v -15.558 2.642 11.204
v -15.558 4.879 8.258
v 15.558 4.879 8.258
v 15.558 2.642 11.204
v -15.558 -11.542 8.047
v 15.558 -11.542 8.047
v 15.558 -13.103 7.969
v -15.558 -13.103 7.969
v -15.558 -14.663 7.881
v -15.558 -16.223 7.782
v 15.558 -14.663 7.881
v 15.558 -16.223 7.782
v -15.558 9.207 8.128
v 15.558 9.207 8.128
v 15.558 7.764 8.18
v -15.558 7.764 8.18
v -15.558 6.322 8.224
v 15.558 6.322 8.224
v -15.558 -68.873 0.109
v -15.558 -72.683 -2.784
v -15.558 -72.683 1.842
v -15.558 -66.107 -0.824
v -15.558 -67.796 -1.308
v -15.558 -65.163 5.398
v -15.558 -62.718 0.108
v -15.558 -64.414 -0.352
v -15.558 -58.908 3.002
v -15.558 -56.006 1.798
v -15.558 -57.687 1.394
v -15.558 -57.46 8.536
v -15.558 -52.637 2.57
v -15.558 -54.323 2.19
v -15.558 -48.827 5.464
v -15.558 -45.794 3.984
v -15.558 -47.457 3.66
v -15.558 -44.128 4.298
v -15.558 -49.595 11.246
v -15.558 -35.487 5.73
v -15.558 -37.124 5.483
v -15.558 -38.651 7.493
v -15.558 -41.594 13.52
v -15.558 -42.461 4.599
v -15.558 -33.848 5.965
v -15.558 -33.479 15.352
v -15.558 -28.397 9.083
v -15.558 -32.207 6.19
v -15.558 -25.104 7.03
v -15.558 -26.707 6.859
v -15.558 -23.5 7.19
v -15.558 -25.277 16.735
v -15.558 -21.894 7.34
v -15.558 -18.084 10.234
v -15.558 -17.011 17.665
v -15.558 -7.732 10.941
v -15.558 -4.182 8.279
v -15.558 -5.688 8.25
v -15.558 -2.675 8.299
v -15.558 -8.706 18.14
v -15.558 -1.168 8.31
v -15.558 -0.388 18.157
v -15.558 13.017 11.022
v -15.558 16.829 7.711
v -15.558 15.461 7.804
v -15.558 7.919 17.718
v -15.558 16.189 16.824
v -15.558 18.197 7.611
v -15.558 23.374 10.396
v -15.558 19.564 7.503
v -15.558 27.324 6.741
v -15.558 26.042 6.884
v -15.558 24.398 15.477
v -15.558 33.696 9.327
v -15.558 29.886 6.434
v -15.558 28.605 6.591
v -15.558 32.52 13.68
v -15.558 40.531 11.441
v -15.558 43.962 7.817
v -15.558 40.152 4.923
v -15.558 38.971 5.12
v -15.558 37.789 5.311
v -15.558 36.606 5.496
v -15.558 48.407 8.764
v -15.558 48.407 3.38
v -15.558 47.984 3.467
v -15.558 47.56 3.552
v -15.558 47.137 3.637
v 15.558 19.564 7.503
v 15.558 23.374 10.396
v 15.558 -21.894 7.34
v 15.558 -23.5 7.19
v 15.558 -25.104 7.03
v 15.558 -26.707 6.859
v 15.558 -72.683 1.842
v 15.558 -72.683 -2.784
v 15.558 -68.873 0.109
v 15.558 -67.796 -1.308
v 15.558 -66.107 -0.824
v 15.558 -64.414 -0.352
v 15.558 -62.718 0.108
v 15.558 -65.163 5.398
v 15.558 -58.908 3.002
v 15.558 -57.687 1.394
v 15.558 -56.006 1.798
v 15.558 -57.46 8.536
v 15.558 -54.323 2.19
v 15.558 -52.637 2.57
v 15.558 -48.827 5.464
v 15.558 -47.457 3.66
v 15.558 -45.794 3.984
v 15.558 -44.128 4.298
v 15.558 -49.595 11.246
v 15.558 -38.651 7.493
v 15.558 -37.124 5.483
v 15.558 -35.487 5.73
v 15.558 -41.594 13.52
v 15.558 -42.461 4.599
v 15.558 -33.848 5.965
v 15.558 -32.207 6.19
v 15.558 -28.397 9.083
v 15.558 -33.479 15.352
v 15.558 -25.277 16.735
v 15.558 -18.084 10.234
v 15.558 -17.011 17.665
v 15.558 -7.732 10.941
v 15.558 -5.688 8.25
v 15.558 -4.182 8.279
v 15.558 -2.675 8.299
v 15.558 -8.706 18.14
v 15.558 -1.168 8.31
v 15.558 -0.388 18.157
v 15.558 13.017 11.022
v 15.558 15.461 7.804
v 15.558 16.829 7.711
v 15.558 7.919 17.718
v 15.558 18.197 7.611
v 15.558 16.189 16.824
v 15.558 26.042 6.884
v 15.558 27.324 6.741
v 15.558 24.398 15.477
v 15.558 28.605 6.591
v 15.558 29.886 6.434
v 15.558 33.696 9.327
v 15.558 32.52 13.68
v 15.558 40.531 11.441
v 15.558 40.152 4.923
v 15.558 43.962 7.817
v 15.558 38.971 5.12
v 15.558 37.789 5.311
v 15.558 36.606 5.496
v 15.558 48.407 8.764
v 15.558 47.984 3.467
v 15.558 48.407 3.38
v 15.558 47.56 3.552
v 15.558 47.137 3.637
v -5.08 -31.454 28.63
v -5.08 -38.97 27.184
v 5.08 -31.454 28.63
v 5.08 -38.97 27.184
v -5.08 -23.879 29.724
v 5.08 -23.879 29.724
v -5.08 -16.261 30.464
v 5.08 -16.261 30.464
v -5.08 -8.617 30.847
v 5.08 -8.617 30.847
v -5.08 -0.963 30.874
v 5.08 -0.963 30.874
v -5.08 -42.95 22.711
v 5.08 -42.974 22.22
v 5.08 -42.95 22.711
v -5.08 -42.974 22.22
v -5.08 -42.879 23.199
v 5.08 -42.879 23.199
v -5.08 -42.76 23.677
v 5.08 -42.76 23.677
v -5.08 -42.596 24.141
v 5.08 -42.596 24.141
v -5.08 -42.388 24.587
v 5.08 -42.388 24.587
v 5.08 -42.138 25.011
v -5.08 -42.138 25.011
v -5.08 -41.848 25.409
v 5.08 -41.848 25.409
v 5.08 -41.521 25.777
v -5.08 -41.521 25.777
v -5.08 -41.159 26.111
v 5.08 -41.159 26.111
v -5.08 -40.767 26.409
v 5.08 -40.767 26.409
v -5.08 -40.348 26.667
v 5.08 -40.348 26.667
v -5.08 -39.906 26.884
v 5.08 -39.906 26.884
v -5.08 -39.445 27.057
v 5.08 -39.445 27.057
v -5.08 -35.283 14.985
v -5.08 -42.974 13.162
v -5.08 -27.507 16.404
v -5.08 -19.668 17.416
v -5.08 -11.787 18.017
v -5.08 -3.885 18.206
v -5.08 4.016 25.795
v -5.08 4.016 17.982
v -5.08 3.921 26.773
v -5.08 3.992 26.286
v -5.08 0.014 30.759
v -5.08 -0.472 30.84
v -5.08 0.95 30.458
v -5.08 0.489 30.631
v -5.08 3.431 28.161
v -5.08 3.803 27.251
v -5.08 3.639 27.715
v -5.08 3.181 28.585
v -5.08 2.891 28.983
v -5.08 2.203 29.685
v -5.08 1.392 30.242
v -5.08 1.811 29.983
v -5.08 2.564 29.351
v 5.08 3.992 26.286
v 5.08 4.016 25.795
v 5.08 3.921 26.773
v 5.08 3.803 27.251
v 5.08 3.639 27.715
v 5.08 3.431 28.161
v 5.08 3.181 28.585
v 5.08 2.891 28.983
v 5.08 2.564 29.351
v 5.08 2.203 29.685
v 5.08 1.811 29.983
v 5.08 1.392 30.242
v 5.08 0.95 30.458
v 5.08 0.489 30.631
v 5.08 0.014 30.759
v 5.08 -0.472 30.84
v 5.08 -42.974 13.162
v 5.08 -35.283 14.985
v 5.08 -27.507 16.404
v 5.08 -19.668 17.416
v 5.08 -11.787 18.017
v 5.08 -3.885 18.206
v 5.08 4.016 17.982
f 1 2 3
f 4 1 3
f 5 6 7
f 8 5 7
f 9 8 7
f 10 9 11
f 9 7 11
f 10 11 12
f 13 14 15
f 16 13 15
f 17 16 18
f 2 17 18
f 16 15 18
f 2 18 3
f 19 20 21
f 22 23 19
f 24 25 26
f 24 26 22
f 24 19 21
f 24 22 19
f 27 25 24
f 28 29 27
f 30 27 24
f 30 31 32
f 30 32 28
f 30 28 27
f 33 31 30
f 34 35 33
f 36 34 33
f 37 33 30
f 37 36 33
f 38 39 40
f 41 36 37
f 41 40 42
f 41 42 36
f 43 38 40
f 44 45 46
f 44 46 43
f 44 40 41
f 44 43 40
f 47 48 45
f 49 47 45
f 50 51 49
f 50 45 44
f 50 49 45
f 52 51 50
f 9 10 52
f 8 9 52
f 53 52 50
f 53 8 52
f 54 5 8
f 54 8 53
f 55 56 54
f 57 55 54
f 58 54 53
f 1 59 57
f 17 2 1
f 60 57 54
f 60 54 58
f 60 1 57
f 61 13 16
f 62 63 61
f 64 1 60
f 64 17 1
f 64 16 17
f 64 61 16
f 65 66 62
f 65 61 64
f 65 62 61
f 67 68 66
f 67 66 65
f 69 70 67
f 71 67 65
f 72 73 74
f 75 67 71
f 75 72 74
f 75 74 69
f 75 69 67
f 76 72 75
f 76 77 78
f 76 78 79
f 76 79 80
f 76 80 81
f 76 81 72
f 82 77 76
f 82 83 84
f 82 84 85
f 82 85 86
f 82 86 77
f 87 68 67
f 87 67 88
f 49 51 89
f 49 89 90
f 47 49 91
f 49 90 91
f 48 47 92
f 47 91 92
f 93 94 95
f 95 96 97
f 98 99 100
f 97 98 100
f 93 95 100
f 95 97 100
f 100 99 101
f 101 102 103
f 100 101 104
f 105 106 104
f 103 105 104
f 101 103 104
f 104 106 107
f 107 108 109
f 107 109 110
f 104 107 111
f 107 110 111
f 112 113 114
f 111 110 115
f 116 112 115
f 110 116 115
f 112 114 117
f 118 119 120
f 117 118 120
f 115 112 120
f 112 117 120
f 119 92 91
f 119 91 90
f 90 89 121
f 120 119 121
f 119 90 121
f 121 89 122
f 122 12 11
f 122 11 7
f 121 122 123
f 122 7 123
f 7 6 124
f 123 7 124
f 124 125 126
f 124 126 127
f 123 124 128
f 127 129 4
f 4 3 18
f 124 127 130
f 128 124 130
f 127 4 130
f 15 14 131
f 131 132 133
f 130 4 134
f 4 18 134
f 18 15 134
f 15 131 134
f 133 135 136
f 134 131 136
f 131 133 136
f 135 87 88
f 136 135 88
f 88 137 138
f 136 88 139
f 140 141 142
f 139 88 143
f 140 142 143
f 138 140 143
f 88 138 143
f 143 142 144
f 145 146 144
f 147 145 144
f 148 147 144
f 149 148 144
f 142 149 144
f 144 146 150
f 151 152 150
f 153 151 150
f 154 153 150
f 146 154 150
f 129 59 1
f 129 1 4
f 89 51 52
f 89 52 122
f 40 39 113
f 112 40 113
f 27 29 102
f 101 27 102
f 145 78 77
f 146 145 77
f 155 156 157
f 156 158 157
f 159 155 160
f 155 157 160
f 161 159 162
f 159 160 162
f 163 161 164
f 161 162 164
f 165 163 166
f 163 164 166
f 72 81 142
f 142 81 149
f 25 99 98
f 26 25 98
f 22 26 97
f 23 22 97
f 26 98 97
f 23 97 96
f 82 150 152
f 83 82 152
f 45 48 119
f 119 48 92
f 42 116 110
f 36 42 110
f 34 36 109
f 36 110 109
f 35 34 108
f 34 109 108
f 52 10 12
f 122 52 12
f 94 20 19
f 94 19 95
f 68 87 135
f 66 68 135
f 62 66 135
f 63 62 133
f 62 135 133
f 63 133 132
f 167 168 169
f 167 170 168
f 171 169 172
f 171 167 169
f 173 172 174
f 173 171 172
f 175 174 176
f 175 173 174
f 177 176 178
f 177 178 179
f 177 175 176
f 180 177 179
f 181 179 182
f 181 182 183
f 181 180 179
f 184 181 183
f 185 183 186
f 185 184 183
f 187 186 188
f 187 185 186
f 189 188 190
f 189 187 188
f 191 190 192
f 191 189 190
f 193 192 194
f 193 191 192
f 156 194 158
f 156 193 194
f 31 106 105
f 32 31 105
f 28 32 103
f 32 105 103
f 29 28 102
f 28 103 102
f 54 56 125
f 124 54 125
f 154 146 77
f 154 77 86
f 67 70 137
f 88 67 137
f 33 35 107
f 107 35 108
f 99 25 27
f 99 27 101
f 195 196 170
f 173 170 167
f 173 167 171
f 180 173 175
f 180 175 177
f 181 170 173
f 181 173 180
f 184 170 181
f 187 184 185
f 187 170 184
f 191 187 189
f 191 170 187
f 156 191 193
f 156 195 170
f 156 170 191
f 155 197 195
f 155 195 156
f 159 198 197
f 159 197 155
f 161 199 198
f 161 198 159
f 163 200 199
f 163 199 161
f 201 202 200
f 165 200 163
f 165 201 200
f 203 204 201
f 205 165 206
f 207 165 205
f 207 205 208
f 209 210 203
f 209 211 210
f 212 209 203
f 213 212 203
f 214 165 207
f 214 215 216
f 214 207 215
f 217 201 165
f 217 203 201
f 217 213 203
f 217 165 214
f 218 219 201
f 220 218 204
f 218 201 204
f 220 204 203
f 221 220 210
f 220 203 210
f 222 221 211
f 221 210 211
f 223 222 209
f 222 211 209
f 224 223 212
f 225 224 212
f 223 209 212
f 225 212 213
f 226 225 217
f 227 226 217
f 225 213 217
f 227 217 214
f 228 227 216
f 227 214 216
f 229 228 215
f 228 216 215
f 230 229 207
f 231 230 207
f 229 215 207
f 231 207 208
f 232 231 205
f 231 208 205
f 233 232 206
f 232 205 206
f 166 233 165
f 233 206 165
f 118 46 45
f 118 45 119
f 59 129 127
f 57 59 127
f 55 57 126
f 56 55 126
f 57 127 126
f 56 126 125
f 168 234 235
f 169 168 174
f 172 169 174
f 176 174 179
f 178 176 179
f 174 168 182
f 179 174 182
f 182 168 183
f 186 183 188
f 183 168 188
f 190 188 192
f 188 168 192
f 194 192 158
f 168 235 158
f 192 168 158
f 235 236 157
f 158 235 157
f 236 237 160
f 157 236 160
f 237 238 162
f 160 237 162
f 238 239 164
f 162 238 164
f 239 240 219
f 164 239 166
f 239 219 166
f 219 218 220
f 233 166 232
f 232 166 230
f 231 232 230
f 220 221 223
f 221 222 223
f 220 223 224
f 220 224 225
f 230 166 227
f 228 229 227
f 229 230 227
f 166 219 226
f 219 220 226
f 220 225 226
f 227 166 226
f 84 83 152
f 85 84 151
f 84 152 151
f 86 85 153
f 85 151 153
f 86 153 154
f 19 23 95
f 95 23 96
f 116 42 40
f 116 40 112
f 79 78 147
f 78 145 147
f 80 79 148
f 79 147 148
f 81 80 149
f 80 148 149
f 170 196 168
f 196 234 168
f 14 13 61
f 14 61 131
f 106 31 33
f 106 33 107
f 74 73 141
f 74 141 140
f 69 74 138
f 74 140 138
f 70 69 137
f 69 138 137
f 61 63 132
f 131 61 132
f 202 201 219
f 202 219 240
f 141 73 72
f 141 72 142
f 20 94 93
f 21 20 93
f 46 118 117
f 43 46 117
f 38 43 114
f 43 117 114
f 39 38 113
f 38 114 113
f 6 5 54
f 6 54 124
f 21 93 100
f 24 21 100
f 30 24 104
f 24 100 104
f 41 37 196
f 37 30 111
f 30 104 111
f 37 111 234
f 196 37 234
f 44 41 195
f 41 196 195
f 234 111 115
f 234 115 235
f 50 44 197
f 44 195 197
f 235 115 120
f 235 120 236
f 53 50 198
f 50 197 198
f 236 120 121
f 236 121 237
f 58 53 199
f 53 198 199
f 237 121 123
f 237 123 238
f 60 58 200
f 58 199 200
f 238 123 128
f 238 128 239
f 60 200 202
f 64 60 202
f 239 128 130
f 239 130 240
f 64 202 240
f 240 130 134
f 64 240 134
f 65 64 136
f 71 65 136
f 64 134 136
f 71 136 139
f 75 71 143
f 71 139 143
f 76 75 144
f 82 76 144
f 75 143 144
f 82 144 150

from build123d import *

# Parameters (mm, degrees)
BOSS_EXTRUDE1_DEPTH      = 76.2
SKETCH2_W                = 6.985
SKETCH2_H                = 9.525
CUT_EXTRUDE1_DEPTH       = 119.84173867
CUT_EXTRUDE2_DEPTH       = 119.84173867
CUT_EXTRUDE3_DEPTH       = 119.84173867
FILLET1_R                = 2.54
CUT_EXTRUDE4_DEPTH       = 5.08
CUT_EXTRUDE6_DEPTH       = 15.113
FILLET2_R                = 0.508
BOSS_EXTRUDE3_DEPTH      = 31.115
BOSS_EXTRUDE4_DEPTH      = 5.08
CUT_EXTRUDE7_DEPTH       = 85.888967529
CRVPATTERN3_START        = 20.1179377
CRVPATTERN3_OUTLINE_W    = 31.115
CRVPATTERN3_OUTLINE_H    = 7.094089262
CRVPATTERN3_DEPTH        = 4.784345088
CRVPATTERN3_START_2      = 12.248105014
CRVPATTERN3_2_OUTLINE_W  = 31.115
CRVPATTERN3_2_OUTLINE_H  = 6.763167552
CRVPATTERN3_2_DEPTH      = 4.784345087
CRVPATTERN3_START_3      = 4.095774155
CRVPATTERN3_3_OUTLINE_W  = 31.115
CRVPATTERN3_3_OUTLINE_H  = 6.419828923
CRVPATTERN3_3_DEPTH      = 4.784345087
CRVPATTERN3_START_4      = -4.324087509
CRVPATTERN3_4_OUTLINE_W  = 31.115
CRVPATTERN3_4_OUTLINE_H  = 6.064703736
CRVPATTERN3_4_DEPTH      = 4.784345087
CRVPATTERN3_START_5      = 27.690823503
CRVPATTERN3_5_OUTLINE_W  = 31.115
CRVPATTERN3_5_OUTLINE_H  = 6.047255266
CRVPATTERN3_5_DEPTH      = 4.784345088
CRVPATTERN3_START_6      = -12.996021434
CRVPATTERN3_6_OUTLINE_W  = 31.115
CRVPATTERN3_6_OUTLINE_H  = 5.698443985
CRVPATTERN3_6_DEPTH      = 4.784345087
CRVPATTERN3_START_7      = -21.904106282
CRVPATTERN3_7_OUTLINE_W  = 31.115
CRVPATTERN3_7_OUTLINE_H  = 5.321722107
CRVPATTERN3_7_DEPTH      = 4.784345088
CRVPATTERN3_START_8      = -31.031987149
CRVPATTERN3_8_OUTLINE_W  = 31.115
CRVPATTERN3_8_OUTLINE_H  = 4.935229754
CRVPATTERN3_8_DEPTH      = 4.784345087
CRVPATTERN3_START_9      = -40.362905596
CRVPATTERN3_9_OUTLINE_W  = 31.115
CRVPATTERN3_9_OUTLINE_H  = 4.539676505
CRVPATTERN3_9_DEPTH      = 4.784345087
CRVPATTERN3_START_10     = -49.879730415
CRVPATTERN3_10_OUTLINE_W = 31.115
CRVPATTERN3_10_OUTLINE_H = 4.135788586
CRVPATTERN3_10_DEPTH     = 4.784345088
CRVPATTERN3_START_11     = -59.564989077
CRVPATTERN3_11_OUTLINE_W = 31.115
CRVPATTERN3_11_OUTLINE_H = 3.724307516
CRVPATTERN3_11_DEPTH     = 4.784345087
FILLET3_R                = 5.08


# Read off the part's stored shape, not the designer's step: CrvPattern3
with BuildPart() as part:
    # Sketch1 → Boss-Extrude1 (new body)
    with BuildSketch(Plane.XY):
        Polygon((-15.5575, 76.2), (15.5575, 76.2), (15.5575, -76.2), (7.845485509, -76.2), (9.525, -85.725), (-9.525, -85.725), (-7.845485509, -76.2), (-15.5575, -76.2), align=None)
    extrude(amount=BOSS_EXTRUDE1_DEPTH)

    # Sketch2 → Cut-Extrude1 (cut, through all)
    with BuildSketch(Plane(origin=(15.5575, 0, 0), x_dir=(0, 0, -1), z_dir=(1, 0, 0))):
        with Locations((-3.4925, -80.9625)):
            Rectangle(SKETCH2_W, SKETCH2_H)
    extrude(amount=-CUT_EXTRUDE1_DEPTH, mode=Mode.SUBTRACT)

    # Sketch3 → Cut-Extrude2 (cut, through all)
    with BuildSketch(Plane(origin=(15.5575, 0, 0), x_dir=(0, 0, -1), z_dir=(1, 0, 0))):
        with BuildLine():
            Line((-76.2, -85.725), (-76.2, -76.2))
            Line((-76.2, -76.2), (-76.2, 76.2))
            Line((-76.2, 76.2), (-6.541803462, 76.2))
            ThreePointArc((-6.541803462, 76.2), (-58.046669251, 2.411215556), (-76.2, -85.725))
        make_face()
        with BuildLine():
            Line((0, -76.2), (0, 67.75939176))
            ThreePointArc((0, 67.75939176), (-18.20597202, -4.22030412), (0, -76.2))
        make_face()
    extrude(amount=-CUT_EXTRUDE2_DEPTH, mode=Mode.SUBTRACT)

    # Sketch6 → Cut-Extrude3 (cut, through all)
    with BuildSketch(Plane(origin=(15.5575, 0, 0), x_dir=(0, 0, -1), z_dir=(1, 0, 0))):
        with BuildLine():
            ThreePointArc((-28.934409948, -61.883434575), (-23.879909813, -60.517759582), (-22.716254779, -55.412963136))
            ThreePointArc((-22.716254779, -55.412963136), (-30.753414225, -11.294498854), (-26.546552055, 33.352305435))
            ThreePointArc((-26.546552055, 33.352305435), (-49.181053892, -9.446405872), (-61.429710833, -56.286781256))
            ThreePointArc((-61.429710833, -56.286781256), (-59.737369376, -60.827463042), (-55.008021131, -61.883434575))
            ThreePointArc((-55.008021131, -61.883434575), (-41.971215539, -60.062859411), (-28.934409948, -61.883434575))
        make_face()
    extrude(amount=-CUT_EXTRUDE3_DEPTH, mode=Mode.SUBTRACT)

    # Fillet1
    fillet1_edges = [part.edges().sort_by_distance(p)[0] for p in [
        (0, 33.352305435, 26.546552055),
    ]]
    fillet(fillet1_edges, radius=FILLET1_R)

    # Sketch7 → Cut-Extrude4 (cut, symmetric)
    with BuildSketch(Plane(origin=(0, 0, 0), x_dir=(0, 0, -1), z_dir=(1, 0, 0))):
        with BuildLine():
            Line((-30.699128799, 4.016230293), (-17.981752538, 4.016230293))
            ThreePointArc((-17.981752538, 4.016230293), (-17.415803594, -19.667907964), (-13.161921654, -42.973769707))
            Line((-13.161921654, -42.973769707), (-26.264177108, -42.973769707))
            ThreePointArc((-26.264177108, -42.973769707), (-30.179968378, -19.639057999), (-30.699128799, 4.016230293))
        make_face()
    extrude(amount=CUT_EXTRUDE4_DEPTH, both=True, mode=Mode.SUBTRACT)

    # Sketch10 → Cut-Extrude6 (cut, symmetric)
    with BuildSketch(Plane(origin=(15.5575, 76.2, 6.541803462), x_dir=(-1, 0, 0), z_dir=(0, -0.7903999954772005, -0.6125910929401777))):
        Polygon((0, 5.170641427), (6.985, 5.170641427), (0, -3.655858573), align=None)
        Polygon((31.115, 5.170641427), (31.115, -3.655858573), (24.13, 5.170641427), align=None)
    extrude(amount=CUT_EXTRUDE6_DEPTH, both=True, mode=Mode.SUBTRACT)

    # Fillet2
    fillet2_edges = [part.edges().sort_by_distance(p)[0] for p in [
        (0, 76.2, 6.541803462),
        (-14.111333502, 74.930435776, 7.871138317),
        (14.111333502, 74.930435776, 7.871138317),
        (-15.5575, 5.090891194, 56.873019023),
        (15.5575, 5.090891194, 56.873019023),
    ]]
    fillet(fillet2_edges, radius=FILLET2_R)


with BuildPart() as body_2:
    # Sketch11 → Boss-Extrude3 (new body)
    with BuildSketch(Plane(origin=(15.5575, 0, 0), x_dir=(0, 0, -1), z_dir=(1, 0, 0))):
        with BuildLine():
            Line((-8.76443151, 48.407010808), (-3.38019913, 48.407010808))
            ThreePointArc((-3.38019913, 48.407010808), (-7.998658724, -12.530018981), (2.784381833, -72.682972398))
            Line((2.784381833, -72.682972398), (-1.84156903, -72.682972398))
            ThreePointArc((-1.84156903, -72.682972398), (-17.95915827, -12.861548832), (-8.76443151, 48.407010808))
        make_face()
    extrude(amount=-BOSS_EXTRUDE3_DEPTH)


with BuildPart() as body_3:
    # Sketch13 → Boss-Extrude4 (new, symmetric)
    with BuildSketch(Plane(origin=(0, 0, 0), x_dir=(0, 0, -1), z_dir=(1, 0, 0))):
        with BuildLine():
            Line((-13.161921654, -42.973769707), (-26.264177108, -42.973769707))
            ThreePointArc((-26.264177108, -42.973769707), (-30.179968378, -19.639057999), (-30.699128799, 4.016230293))
            Line((-30.699128799, 4.016230293), (-17.981752538, 4.016230293))
            ThreePointArc((-17.981752538, 4.016230293), (-17.415803594, -19.667907964), (-13.161921654, -42.973769707))
        make_face()
    extrude(amount=BOSS_EXTRUDE4_DEPTH, both=True)


with BuildPart() as body_2_1:
    add(body_2.part)

    # Combine1: union body 3
    add(body_3.part)

    # Sketch14 → Cut-Extrude7 (cut, through all)
    with BuildSketch(Plane(origin=(15.5575, 0, 0), x_dir=(0, 0, -1), z_dir=(1, 0, 0))):
        Polygon((-3.636956276, 47.137010808), (-0.743194378, 43.327010808), (-4.923479567, 40.152010808), (-7.817241465, 43.962010808), align=None)
    extrude(amount=-CUT_EXTRUDE7_DEPTH, mode=Mode.SUBTRACT)

    # CrvPattern3 outline → CrvPattern3 (cut)
    with BuildSketch(Plane(origin=(0, 0, 0), x_dir=(1, 0, 0), z_dir=(0, 0.7963472387815729, 0.604839710406786)).offset(CRVPATTERN3_START)):
        with Locations((0, 9.405700103)):
            Rectangle(CRVPATTERN3_OUTLINE_W, CRVPATTERN3_OUTLINE_H)
    extrude(amount=CRVPATTERN3_DEPTH, mode=Mode.SUBTRACT)

    # CrvPattern3 2 outline → CrvPattern3 2 (cut)
    with BuildSketch(Plane(origin=(0, 0, 0), x_dir=(1, 0, 0), z_dir=(0, 0.7963472387815729, 0.604839710406786)).offset(CRVPATTERN3_START_2)):
        with Locations((0, 2.477071696)):
            Rectangle(CRVPATTERN3_2_OUTLINE_W, CRVPATTERN3_2_OUTLINE_H)
    extrude(amount=CRVPATTERN3_2_DEPTH, mode=Mode.SUBTRACT)

    # CrvPattern3 3 outline → CrvPattern3 3 (cut)
    with BuildSketch(Plane(origin=(0, 0, 0), x_dir=(1, 0, 0), z_dir=(0, 0.7963472387815729, 0.604839710406786)).offset(CRVPATTERN3_START_3)):
        with Locations((0, -4.114426542)):
            Rectangle(CRVPATTERN3_3_OUTLINE_W, CRVPATTERN3_3_OUTLINE_H)
    extrude(amount=CRVPATTERN3_3_DEPTH, mode=Mode.SUBTRACT)

    # CrvPattern3 4 outline → CrvPattern3 4 (cut)
    with BuildSketch(Plane(origin=(0, 0, 0), x_dir=(1, 0, 0), z_dir=(0, 0.7963472387815729, 0.604839710406786)).offset(CRVPATTERN3_START_4)):
        with Locations((0, -10.356692871)):
            Rectangle(CRVPATTERN3_4_OUTLINE_W, CRVPATTERN3_4_OUTLINE_H)
    extrude(amount=CRVPATTERN3_4_DEPTH, mode=Mode.SUBTRACT)

    # CrvPattern3 5 outline → CrvPattern3 5 (cut)
    with BuildSketch(Plane(origin=(0, 0, 0), x_dir=(1, 0, 0), z_dir=(0, 0.7963472387815729, 0.604839710406786)).offset(CRVPATTERN3_START_5)):
        with Locations((0, 15.976372367)):
            Rectangle(CRVPATTERN3_5_OUTLINE_W, CRVPATTERN3_5_OUTLINE_H)
    extrude(amount=CRVPATTERN3_5_DEPTH, mode=Mode.SUBTRACT)

    # CrvPattern3 6 outline → CrvPattern3 6 (cut)
    with BuildSketch(Plane(origin=(0, 0, 0), x_dir=(1, 0, 0), z_dir=(0, 0.7963472387815729, 0.604839710406786)).offset(CRVPATTERN3_START_6)):
        with Locations((0, -16.238266732)):
            Rectangle(CRVPATTERN3_6_OUTLINE_W, CRVPATTERN3_6_OUTLINE_H)
    extrude(amount=CRVPATTERN3_6_DEPTH, mode=Mode.SUBTRACT)

    # CrvPattern3 7 outline → CrvPattern3 7 (cut)
    with BuildSketch(Plane(origin=(0, 0, 0), x_dir=(1, 0, 0), z_dir=(0, 0.7963472387815729, 0.604839710406786)).offset(CRVPATTERN3_START_7)):
        with Locations((0, -21.748349778)):
            Rectangle(CRVPATTERN3_7_OUTLINE_W, CRVPATTERN3_7_OUTLINE_H)
    extrude(amount=CRVPATTERN3_7_DEPTH, mode=Mode.SUBTRACT)

    # CrvPattern3 8 outline → CrvPattern3 8 (cut)
    with BuildSketch(Plane(origin=(0, 0, 0), x_dir=(1, 0, 0), z_dir=(0, 0.7963472387815729, 0.604839710406786)).offset(CRVPATTERN3_START_8)):
        with Locations((0, -26.876825708)):
            Rectangle(CRVPATTERN3_8_OUTLINE_W, CRVPATTERN3_8_OUTLINE_H)
    extrude(amount=CRVPATTERN3_8_DEPTH, mode=Mode.SUBTRACT)

    # CrvPattern3 9 outline → CrvPattern3 9 (cut)
    with BuildSketch(Plane(origin=(0, 0, 0), x_dir=(1, 0, 0), z_dir=(0, 0.7963472387815729, 0.604839710406786)).offset(CRVPATTERN3_START_9)):
        with Locations((0, -31.614278838)):
            Rectangle(CRVPATTERN3_9_OUTLINE_W, CRVPATTERN3_9_OUTLINE_H)
    extrude(amount=CRVPATTERN3_9_DEPTH, mode=Mode.SUBTRACT)

    # CrvPattern3 10 outline → CrvPattern3 10 (cut)
    with BuildSketch(Plane(origin=(0, 0, 0), x_dir=(1, 0, 0), z_dir=(0, 0.7963472387815729, 0.604839710406786)).offset(CRVPATTERN3_START_10)):
        with Locations((0, -35.952011383)):
            Rectangle(CRVPATTERN3_10_OUTLINE_W, CRVPATTERN3_10_OUTLINE_H)
    extrude(amount=CRVPATTERN3_10_DEPTH, mode=Mode.SUBTRACT)

    # CrvPattern3 11 outline → CrvPattern3 11 (cut)
    with BuildSketch(Plane(origin=(0, 0, 0), x_dir=(1, 0, 0), z_dir=(0, 0.7963472387815729, 0.604839710406786)).offset(CRVPATTERN3_START_11)):
        with Locations((0, -39.882059434)):
            Rectangle(CRVPATTERN3_11_OUTLINE_W, CRVPATTERN3_11_OUTLINE_H)
    extrude(amount=CRVPATTERN3_11_DEPTH, mode=Mode.SUBTRACT)

    # Fillet3
    fillet3_edges = [body_2_1.edges().sort_by_distance(p)[0] for p in [
        (0, 4.016230293, 30.699128799),
        (0, -42.973769707, 26.264177108),
    ]]
    fillet(fillet3_edges, radius=FILLET3_R)


solid = body_2_1.part
